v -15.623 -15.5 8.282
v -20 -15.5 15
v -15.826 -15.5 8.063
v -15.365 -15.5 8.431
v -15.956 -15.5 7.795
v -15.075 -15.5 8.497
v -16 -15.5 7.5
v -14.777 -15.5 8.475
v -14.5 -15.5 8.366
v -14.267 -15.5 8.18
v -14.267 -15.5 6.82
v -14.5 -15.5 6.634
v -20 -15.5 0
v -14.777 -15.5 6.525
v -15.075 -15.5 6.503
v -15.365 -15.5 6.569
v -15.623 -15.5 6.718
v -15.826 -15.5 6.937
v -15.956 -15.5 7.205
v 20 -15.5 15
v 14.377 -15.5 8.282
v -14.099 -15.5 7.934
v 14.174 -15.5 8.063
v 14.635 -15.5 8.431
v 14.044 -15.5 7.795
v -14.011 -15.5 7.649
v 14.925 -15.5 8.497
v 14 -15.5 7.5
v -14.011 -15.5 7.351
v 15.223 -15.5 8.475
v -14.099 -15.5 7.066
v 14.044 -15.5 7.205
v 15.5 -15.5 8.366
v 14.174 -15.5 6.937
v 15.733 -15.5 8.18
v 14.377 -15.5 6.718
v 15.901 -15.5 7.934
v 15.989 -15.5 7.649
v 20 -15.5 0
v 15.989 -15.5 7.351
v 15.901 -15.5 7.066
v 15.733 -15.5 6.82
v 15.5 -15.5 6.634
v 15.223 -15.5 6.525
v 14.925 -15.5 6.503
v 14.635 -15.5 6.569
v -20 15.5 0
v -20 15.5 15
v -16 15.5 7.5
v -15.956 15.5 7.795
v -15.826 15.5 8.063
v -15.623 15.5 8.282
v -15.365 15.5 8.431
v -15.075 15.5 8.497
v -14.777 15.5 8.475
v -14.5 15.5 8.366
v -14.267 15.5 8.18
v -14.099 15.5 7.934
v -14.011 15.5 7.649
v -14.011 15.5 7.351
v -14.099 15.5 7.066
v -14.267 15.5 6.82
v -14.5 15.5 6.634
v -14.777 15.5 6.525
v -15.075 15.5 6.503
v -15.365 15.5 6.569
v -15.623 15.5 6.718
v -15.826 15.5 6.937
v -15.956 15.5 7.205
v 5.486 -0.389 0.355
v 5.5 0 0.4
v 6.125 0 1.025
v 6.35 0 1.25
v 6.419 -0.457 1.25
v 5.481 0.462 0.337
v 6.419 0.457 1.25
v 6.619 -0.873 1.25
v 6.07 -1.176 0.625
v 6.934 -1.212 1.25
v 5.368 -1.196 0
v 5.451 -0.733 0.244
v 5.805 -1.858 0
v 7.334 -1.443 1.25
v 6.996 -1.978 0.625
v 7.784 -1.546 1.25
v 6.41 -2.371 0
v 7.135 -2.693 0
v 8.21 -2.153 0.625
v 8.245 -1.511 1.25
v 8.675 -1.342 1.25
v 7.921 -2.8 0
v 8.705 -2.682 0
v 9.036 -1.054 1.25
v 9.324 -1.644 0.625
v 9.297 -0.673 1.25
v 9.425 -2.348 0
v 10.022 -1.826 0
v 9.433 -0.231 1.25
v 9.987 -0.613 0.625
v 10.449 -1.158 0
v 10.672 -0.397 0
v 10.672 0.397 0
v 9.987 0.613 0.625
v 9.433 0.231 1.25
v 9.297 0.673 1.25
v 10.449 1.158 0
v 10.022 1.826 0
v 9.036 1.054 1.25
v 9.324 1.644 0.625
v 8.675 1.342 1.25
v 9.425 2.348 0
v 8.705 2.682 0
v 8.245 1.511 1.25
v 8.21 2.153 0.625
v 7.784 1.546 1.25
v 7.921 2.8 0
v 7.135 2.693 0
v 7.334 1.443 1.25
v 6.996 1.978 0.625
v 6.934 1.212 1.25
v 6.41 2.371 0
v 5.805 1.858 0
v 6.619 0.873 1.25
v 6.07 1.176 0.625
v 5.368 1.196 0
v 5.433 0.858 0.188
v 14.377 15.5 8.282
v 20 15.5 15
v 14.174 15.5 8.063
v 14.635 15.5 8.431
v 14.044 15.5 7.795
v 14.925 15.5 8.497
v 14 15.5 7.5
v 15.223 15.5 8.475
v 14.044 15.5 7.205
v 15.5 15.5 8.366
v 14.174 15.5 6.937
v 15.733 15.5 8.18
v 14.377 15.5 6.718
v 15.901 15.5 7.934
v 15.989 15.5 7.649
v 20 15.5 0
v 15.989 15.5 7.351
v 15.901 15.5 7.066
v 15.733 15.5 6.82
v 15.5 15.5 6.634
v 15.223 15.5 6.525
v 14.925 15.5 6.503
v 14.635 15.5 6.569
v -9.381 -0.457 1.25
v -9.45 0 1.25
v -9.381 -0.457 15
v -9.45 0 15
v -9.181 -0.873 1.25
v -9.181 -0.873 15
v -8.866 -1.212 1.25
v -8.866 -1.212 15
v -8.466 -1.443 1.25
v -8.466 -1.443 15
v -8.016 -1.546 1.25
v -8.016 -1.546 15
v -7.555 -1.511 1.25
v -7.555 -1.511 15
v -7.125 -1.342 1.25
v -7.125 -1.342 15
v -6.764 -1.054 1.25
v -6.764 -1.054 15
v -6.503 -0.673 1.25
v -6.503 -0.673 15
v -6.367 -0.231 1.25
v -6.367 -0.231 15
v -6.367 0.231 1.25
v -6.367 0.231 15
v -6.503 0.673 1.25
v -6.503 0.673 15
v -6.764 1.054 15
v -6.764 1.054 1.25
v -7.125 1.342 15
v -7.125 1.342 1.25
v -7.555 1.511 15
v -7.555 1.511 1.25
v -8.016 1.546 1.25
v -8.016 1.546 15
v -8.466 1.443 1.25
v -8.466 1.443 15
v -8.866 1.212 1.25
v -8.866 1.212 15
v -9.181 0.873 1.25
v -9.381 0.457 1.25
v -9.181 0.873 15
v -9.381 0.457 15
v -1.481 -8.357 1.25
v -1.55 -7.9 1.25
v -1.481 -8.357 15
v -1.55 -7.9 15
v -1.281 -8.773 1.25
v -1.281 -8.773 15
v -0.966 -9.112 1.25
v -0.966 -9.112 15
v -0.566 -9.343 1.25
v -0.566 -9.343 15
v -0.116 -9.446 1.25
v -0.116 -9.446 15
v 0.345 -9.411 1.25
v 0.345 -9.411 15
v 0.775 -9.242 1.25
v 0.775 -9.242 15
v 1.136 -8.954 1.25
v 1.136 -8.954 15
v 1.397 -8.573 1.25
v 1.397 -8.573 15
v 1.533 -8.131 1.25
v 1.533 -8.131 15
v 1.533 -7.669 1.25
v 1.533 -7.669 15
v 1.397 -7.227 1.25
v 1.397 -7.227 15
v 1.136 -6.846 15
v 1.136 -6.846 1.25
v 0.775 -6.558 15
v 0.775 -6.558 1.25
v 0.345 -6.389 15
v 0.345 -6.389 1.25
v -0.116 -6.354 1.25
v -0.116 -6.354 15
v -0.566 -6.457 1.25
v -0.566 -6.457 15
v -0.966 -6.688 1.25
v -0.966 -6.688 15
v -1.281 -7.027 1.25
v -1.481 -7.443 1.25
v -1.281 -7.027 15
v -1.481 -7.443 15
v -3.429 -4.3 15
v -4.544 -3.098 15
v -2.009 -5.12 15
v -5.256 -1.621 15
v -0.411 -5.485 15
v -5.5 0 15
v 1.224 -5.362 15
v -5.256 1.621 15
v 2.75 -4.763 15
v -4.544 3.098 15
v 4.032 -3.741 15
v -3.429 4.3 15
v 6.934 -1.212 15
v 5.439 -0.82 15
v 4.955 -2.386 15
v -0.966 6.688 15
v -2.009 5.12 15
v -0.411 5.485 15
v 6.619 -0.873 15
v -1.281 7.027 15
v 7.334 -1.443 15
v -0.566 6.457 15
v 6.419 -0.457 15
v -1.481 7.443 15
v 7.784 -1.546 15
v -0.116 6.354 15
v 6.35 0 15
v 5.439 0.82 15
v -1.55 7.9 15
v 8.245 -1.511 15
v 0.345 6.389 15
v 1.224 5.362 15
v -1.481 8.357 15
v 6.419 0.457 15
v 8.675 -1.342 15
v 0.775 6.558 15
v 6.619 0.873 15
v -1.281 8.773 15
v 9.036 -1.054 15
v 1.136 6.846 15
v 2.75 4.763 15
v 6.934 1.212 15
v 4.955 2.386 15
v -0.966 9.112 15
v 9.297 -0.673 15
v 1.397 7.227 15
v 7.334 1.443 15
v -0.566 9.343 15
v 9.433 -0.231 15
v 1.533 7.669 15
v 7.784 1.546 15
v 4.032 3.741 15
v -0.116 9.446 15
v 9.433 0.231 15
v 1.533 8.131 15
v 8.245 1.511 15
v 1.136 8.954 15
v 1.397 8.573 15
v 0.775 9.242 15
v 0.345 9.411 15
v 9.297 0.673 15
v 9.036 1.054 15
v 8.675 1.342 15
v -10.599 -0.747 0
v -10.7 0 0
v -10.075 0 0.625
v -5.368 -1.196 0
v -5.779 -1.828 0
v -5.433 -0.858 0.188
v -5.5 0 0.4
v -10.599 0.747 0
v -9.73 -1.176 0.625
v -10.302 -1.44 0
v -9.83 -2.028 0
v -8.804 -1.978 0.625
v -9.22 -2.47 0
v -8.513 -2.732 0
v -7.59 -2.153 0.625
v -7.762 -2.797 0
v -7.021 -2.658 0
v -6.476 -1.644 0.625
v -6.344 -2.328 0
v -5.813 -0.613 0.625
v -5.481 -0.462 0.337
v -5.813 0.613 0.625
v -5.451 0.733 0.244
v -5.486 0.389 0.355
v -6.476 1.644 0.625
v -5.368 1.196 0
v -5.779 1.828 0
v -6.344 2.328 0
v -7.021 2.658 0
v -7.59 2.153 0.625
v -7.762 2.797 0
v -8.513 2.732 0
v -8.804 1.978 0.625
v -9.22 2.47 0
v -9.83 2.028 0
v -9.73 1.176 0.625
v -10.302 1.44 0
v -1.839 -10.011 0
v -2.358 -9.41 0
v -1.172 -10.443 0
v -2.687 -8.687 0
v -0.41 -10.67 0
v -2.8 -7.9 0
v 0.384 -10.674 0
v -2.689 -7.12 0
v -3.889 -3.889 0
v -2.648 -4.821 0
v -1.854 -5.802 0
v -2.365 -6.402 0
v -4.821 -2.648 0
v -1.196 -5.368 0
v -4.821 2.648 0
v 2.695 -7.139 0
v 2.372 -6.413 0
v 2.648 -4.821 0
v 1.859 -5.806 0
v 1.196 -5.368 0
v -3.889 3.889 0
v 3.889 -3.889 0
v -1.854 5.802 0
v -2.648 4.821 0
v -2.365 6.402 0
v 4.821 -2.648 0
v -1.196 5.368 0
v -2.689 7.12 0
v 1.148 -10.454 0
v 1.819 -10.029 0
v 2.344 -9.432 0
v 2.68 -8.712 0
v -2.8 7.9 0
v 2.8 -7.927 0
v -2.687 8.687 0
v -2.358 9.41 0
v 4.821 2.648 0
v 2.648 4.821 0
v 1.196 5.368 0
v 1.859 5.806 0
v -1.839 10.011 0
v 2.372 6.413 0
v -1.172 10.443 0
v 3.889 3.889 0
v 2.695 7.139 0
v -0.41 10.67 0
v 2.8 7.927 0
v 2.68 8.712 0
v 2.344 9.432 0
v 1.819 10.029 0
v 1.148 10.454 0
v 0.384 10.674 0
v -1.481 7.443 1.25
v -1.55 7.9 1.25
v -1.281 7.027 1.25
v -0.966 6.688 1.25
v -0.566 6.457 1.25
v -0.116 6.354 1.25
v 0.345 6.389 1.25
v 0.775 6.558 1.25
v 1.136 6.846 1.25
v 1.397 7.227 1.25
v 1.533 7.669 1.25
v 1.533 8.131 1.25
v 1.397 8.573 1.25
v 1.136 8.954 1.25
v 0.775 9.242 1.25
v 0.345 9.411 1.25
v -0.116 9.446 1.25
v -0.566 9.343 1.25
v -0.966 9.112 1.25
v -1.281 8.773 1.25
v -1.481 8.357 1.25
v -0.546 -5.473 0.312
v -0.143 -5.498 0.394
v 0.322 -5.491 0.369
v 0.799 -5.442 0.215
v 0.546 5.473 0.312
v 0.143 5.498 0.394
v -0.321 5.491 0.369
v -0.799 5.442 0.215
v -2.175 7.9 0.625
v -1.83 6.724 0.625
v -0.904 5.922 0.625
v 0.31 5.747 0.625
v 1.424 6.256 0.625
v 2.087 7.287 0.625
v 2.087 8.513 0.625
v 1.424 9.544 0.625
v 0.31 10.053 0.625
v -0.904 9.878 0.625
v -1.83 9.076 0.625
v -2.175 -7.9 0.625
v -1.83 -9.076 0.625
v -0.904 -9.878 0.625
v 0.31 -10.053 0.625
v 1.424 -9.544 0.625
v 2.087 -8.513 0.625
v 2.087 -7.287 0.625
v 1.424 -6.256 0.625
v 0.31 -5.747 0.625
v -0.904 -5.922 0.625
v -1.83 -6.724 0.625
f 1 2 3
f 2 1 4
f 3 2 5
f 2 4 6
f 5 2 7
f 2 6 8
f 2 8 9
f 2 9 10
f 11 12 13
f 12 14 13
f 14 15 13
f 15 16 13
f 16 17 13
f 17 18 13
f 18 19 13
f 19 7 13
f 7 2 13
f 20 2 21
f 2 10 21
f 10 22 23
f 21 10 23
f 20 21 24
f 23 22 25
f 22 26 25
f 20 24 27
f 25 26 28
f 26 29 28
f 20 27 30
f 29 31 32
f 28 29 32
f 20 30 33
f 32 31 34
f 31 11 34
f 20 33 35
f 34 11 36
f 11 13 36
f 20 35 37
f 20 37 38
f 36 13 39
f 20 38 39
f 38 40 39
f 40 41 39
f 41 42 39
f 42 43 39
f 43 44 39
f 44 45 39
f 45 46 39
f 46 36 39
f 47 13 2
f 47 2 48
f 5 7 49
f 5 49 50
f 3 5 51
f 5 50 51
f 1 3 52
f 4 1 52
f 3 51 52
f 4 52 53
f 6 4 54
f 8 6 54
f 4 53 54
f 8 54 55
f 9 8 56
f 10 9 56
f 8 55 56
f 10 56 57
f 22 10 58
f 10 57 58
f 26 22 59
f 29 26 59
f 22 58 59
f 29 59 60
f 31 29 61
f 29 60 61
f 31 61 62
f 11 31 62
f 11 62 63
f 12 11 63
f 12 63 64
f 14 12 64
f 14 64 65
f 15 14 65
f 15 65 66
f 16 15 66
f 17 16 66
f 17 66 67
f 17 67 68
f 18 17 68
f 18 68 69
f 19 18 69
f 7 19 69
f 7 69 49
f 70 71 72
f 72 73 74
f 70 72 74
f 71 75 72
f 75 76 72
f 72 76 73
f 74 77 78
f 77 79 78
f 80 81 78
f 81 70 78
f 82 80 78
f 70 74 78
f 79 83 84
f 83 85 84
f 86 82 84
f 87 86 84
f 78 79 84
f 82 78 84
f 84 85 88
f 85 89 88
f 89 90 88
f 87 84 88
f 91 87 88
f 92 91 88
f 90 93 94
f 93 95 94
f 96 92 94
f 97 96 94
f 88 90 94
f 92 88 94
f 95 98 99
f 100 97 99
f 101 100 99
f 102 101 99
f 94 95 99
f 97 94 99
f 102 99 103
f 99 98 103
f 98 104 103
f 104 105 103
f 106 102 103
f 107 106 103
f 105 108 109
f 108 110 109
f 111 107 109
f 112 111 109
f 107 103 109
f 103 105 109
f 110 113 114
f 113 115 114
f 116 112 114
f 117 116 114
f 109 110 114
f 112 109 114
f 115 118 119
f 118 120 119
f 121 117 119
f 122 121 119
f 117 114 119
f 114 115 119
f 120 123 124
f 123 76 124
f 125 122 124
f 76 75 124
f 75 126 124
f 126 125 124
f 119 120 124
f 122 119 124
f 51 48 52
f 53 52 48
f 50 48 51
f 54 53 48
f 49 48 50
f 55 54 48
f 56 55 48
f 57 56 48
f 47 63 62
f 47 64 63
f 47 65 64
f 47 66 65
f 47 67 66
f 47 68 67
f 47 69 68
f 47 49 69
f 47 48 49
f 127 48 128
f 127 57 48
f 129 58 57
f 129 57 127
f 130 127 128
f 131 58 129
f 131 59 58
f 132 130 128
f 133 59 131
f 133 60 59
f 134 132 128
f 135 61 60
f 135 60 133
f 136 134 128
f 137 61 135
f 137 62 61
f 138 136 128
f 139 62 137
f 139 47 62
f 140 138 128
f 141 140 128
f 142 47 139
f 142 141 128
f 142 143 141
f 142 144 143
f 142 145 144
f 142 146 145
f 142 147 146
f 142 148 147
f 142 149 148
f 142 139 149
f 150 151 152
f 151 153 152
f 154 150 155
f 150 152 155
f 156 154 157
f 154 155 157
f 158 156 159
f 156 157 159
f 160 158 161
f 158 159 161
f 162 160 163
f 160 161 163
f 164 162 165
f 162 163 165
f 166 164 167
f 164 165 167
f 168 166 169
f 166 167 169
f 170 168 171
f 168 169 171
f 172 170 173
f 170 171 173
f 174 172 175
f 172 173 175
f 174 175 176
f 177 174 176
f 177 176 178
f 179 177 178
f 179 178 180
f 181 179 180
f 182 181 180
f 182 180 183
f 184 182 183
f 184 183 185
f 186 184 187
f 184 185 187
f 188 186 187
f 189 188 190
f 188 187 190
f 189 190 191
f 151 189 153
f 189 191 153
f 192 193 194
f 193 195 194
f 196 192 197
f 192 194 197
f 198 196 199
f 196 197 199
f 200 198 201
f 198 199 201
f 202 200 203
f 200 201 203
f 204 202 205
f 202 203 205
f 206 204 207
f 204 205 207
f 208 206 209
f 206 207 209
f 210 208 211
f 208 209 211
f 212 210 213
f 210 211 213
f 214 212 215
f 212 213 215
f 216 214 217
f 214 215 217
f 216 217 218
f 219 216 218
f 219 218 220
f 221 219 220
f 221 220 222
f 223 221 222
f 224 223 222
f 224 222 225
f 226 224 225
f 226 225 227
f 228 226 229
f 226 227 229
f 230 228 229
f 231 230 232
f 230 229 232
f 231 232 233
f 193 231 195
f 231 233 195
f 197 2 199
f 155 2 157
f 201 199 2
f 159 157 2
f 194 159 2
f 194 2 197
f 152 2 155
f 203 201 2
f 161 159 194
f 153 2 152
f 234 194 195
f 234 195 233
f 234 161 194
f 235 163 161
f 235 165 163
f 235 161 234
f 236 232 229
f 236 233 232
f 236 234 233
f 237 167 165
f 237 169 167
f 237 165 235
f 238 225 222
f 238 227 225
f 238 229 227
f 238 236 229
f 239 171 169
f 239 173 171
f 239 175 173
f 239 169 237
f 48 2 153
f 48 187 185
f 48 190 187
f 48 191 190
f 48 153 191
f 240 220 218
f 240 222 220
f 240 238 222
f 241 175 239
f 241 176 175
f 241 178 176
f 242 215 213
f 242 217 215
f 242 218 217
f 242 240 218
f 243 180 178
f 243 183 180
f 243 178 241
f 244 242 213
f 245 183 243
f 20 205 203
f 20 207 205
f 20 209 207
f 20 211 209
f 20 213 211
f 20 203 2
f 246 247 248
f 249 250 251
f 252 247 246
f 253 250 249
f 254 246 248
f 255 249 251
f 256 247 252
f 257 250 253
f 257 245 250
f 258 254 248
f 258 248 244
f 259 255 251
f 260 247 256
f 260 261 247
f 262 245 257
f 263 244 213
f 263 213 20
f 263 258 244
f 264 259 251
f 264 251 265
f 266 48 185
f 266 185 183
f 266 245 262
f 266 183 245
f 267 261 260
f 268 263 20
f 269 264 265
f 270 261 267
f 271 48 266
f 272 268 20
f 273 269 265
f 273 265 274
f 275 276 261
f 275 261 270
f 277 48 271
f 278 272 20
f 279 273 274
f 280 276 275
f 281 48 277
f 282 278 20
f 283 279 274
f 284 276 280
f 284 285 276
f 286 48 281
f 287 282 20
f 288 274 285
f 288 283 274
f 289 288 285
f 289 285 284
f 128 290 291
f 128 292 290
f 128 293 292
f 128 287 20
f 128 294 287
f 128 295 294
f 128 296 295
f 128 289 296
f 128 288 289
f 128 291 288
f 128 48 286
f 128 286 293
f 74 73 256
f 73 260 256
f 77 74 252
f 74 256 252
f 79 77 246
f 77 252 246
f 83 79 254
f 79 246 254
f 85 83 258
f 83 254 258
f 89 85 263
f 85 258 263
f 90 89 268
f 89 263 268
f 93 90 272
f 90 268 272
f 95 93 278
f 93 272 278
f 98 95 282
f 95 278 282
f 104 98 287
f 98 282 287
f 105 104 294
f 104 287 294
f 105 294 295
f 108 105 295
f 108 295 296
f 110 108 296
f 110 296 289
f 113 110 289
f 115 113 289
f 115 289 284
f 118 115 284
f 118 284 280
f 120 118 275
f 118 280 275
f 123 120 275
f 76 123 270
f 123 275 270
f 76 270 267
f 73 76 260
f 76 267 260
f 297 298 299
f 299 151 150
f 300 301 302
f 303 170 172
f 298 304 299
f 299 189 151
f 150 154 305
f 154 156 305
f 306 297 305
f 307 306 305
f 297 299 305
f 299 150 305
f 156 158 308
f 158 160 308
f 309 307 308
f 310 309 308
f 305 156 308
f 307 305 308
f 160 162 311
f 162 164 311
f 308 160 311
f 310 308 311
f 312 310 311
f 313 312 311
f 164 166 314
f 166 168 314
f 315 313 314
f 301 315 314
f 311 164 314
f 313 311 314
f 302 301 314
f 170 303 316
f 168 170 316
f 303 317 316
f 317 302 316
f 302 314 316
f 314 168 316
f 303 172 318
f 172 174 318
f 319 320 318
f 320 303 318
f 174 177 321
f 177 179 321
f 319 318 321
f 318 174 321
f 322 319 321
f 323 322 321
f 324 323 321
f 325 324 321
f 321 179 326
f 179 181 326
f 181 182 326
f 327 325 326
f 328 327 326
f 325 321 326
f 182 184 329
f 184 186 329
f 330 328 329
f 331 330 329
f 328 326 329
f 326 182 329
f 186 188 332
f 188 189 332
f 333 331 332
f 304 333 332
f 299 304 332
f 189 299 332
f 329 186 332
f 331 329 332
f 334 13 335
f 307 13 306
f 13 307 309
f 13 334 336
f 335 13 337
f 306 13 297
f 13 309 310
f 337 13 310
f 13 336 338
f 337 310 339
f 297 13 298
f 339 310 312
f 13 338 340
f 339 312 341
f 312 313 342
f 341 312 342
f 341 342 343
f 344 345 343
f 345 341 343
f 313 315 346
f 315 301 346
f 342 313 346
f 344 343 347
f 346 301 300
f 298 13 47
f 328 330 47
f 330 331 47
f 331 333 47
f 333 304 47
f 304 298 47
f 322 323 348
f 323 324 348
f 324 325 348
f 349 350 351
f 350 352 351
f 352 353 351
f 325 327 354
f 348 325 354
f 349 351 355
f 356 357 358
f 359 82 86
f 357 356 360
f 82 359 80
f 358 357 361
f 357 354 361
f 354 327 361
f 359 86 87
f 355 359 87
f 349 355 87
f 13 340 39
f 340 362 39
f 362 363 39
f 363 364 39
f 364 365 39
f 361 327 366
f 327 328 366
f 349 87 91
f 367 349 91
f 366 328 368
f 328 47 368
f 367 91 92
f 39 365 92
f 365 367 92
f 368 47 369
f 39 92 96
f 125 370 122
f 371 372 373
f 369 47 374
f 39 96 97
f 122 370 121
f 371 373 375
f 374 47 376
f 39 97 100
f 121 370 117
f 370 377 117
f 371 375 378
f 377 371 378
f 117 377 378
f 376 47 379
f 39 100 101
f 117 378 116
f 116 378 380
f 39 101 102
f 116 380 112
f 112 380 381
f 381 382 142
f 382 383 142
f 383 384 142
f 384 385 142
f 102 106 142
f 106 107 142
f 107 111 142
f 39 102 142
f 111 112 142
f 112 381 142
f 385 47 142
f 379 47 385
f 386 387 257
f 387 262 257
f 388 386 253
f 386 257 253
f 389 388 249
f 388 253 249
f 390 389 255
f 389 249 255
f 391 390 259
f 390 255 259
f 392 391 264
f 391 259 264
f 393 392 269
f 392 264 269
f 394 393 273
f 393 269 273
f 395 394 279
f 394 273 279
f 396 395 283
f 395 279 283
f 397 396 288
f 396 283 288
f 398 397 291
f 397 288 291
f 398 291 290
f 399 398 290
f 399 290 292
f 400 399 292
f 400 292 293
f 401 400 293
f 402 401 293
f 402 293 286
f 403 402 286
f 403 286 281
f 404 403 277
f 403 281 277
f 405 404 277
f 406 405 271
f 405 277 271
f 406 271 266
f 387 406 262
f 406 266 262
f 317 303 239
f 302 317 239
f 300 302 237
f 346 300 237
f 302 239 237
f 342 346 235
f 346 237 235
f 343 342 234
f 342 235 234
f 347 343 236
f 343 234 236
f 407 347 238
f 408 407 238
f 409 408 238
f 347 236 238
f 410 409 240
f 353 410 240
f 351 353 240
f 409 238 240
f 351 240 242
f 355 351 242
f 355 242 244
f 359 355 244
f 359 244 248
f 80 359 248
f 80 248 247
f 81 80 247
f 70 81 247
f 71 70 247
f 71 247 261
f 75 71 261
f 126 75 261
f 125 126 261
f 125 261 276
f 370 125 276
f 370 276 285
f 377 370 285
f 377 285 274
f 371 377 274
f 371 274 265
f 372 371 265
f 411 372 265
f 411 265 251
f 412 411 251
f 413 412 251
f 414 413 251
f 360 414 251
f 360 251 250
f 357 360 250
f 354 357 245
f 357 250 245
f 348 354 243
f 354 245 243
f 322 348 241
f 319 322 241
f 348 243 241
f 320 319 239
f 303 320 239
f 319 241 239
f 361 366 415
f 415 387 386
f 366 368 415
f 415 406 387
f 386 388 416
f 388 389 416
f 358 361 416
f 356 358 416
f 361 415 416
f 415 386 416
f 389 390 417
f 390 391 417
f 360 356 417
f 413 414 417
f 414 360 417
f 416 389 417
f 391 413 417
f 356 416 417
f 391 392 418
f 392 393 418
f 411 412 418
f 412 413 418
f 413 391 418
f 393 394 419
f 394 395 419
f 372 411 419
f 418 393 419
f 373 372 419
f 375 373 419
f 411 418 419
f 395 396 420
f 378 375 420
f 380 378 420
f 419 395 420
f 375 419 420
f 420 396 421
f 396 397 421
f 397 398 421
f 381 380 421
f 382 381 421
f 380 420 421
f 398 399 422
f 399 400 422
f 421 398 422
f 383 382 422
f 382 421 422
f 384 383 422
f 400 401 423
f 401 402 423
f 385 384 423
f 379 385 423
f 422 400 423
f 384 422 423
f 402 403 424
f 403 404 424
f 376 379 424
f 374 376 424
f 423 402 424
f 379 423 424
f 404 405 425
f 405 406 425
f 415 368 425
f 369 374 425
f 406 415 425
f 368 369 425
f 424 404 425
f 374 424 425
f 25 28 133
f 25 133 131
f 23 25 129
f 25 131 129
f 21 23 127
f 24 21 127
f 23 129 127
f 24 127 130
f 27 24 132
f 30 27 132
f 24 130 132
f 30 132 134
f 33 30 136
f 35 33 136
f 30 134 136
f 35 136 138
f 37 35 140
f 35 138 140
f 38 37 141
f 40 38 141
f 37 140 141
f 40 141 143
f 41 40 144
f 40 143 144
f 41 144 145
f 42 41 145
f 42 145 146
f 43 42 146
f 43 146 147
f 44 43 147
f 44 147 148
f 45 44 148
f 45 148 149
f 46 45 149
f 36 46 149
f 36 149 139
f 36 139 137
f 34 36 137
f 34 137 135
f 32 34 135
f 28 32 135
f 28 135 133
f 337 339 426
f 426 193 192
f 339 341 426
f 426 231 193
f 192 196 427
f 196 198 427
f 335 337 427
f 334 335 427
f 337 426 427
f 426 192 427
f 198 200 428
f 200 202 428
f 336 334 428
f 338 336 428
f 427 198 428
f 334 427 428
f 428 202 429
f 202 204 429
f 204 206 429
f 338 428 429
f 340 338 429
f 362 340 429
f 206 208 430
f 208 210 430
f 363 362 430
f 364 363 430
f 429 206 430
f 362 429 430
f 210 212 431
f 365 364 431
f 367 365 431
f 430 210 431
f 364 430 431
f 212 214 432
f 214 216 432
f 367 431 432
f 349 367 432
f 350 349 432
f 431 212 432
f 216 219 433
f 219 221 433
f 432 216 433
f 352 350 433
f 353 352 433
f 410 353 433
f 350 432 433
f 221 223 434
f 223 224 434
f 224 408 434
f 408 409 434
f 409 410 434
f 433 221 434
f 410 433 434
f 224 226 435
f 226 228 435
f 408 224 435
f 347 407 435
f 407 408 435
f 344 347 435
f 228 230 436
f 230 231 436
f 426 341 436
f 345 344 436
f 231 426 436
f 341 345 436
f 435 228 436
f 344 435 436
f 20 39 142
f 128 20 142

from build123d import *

# Parameters (mm, degrees)
F0_W           = 40
F0_H           = 31
F1_DEPTH       = 15
F2_D           = 11
F3_D           = 3.1
F3_CSINK_D     = 5.6
F3_CSINK_ANGLE = 90
F5_D           = 2


with BuildPart() as f1:
    # F0 (on Top) → F1 (new body)
    with BuildSketch(Plane.XY):
        Rectangle(F0_W, F0_H)
    extrude(amount=F1_DEPTH)

    # F2 (through all)
    with Locations(Plane(origin=(0, 0, 0), x_dir=(1, 0, 0), z_dir=(0, 0, -1))):
        with Locations((0, 0)):
            Hole(F2_D / 2)

    # F3 (through all)
    with Locations(Plane(origin=(0, 0, 0), x_dir=(1, 0, 0), z_dir=(0, 0, -1))):
        with Locations((7.9, 0), (0, 7.9), (-7.9, 0), (0, -7.9)):
            CounterSinkHole(F3_D / 2, F3_CSINK_D / 2, counter_sink_angle=F3_CSINK_ANGLE)

    # F5 (through all)
    with Locations(Plane.XZ.offset(15.5)):
        with Locations((-15, 7.5), (15, 7.5)):
            Hole(F5_D / 2)


solid = f1.part
